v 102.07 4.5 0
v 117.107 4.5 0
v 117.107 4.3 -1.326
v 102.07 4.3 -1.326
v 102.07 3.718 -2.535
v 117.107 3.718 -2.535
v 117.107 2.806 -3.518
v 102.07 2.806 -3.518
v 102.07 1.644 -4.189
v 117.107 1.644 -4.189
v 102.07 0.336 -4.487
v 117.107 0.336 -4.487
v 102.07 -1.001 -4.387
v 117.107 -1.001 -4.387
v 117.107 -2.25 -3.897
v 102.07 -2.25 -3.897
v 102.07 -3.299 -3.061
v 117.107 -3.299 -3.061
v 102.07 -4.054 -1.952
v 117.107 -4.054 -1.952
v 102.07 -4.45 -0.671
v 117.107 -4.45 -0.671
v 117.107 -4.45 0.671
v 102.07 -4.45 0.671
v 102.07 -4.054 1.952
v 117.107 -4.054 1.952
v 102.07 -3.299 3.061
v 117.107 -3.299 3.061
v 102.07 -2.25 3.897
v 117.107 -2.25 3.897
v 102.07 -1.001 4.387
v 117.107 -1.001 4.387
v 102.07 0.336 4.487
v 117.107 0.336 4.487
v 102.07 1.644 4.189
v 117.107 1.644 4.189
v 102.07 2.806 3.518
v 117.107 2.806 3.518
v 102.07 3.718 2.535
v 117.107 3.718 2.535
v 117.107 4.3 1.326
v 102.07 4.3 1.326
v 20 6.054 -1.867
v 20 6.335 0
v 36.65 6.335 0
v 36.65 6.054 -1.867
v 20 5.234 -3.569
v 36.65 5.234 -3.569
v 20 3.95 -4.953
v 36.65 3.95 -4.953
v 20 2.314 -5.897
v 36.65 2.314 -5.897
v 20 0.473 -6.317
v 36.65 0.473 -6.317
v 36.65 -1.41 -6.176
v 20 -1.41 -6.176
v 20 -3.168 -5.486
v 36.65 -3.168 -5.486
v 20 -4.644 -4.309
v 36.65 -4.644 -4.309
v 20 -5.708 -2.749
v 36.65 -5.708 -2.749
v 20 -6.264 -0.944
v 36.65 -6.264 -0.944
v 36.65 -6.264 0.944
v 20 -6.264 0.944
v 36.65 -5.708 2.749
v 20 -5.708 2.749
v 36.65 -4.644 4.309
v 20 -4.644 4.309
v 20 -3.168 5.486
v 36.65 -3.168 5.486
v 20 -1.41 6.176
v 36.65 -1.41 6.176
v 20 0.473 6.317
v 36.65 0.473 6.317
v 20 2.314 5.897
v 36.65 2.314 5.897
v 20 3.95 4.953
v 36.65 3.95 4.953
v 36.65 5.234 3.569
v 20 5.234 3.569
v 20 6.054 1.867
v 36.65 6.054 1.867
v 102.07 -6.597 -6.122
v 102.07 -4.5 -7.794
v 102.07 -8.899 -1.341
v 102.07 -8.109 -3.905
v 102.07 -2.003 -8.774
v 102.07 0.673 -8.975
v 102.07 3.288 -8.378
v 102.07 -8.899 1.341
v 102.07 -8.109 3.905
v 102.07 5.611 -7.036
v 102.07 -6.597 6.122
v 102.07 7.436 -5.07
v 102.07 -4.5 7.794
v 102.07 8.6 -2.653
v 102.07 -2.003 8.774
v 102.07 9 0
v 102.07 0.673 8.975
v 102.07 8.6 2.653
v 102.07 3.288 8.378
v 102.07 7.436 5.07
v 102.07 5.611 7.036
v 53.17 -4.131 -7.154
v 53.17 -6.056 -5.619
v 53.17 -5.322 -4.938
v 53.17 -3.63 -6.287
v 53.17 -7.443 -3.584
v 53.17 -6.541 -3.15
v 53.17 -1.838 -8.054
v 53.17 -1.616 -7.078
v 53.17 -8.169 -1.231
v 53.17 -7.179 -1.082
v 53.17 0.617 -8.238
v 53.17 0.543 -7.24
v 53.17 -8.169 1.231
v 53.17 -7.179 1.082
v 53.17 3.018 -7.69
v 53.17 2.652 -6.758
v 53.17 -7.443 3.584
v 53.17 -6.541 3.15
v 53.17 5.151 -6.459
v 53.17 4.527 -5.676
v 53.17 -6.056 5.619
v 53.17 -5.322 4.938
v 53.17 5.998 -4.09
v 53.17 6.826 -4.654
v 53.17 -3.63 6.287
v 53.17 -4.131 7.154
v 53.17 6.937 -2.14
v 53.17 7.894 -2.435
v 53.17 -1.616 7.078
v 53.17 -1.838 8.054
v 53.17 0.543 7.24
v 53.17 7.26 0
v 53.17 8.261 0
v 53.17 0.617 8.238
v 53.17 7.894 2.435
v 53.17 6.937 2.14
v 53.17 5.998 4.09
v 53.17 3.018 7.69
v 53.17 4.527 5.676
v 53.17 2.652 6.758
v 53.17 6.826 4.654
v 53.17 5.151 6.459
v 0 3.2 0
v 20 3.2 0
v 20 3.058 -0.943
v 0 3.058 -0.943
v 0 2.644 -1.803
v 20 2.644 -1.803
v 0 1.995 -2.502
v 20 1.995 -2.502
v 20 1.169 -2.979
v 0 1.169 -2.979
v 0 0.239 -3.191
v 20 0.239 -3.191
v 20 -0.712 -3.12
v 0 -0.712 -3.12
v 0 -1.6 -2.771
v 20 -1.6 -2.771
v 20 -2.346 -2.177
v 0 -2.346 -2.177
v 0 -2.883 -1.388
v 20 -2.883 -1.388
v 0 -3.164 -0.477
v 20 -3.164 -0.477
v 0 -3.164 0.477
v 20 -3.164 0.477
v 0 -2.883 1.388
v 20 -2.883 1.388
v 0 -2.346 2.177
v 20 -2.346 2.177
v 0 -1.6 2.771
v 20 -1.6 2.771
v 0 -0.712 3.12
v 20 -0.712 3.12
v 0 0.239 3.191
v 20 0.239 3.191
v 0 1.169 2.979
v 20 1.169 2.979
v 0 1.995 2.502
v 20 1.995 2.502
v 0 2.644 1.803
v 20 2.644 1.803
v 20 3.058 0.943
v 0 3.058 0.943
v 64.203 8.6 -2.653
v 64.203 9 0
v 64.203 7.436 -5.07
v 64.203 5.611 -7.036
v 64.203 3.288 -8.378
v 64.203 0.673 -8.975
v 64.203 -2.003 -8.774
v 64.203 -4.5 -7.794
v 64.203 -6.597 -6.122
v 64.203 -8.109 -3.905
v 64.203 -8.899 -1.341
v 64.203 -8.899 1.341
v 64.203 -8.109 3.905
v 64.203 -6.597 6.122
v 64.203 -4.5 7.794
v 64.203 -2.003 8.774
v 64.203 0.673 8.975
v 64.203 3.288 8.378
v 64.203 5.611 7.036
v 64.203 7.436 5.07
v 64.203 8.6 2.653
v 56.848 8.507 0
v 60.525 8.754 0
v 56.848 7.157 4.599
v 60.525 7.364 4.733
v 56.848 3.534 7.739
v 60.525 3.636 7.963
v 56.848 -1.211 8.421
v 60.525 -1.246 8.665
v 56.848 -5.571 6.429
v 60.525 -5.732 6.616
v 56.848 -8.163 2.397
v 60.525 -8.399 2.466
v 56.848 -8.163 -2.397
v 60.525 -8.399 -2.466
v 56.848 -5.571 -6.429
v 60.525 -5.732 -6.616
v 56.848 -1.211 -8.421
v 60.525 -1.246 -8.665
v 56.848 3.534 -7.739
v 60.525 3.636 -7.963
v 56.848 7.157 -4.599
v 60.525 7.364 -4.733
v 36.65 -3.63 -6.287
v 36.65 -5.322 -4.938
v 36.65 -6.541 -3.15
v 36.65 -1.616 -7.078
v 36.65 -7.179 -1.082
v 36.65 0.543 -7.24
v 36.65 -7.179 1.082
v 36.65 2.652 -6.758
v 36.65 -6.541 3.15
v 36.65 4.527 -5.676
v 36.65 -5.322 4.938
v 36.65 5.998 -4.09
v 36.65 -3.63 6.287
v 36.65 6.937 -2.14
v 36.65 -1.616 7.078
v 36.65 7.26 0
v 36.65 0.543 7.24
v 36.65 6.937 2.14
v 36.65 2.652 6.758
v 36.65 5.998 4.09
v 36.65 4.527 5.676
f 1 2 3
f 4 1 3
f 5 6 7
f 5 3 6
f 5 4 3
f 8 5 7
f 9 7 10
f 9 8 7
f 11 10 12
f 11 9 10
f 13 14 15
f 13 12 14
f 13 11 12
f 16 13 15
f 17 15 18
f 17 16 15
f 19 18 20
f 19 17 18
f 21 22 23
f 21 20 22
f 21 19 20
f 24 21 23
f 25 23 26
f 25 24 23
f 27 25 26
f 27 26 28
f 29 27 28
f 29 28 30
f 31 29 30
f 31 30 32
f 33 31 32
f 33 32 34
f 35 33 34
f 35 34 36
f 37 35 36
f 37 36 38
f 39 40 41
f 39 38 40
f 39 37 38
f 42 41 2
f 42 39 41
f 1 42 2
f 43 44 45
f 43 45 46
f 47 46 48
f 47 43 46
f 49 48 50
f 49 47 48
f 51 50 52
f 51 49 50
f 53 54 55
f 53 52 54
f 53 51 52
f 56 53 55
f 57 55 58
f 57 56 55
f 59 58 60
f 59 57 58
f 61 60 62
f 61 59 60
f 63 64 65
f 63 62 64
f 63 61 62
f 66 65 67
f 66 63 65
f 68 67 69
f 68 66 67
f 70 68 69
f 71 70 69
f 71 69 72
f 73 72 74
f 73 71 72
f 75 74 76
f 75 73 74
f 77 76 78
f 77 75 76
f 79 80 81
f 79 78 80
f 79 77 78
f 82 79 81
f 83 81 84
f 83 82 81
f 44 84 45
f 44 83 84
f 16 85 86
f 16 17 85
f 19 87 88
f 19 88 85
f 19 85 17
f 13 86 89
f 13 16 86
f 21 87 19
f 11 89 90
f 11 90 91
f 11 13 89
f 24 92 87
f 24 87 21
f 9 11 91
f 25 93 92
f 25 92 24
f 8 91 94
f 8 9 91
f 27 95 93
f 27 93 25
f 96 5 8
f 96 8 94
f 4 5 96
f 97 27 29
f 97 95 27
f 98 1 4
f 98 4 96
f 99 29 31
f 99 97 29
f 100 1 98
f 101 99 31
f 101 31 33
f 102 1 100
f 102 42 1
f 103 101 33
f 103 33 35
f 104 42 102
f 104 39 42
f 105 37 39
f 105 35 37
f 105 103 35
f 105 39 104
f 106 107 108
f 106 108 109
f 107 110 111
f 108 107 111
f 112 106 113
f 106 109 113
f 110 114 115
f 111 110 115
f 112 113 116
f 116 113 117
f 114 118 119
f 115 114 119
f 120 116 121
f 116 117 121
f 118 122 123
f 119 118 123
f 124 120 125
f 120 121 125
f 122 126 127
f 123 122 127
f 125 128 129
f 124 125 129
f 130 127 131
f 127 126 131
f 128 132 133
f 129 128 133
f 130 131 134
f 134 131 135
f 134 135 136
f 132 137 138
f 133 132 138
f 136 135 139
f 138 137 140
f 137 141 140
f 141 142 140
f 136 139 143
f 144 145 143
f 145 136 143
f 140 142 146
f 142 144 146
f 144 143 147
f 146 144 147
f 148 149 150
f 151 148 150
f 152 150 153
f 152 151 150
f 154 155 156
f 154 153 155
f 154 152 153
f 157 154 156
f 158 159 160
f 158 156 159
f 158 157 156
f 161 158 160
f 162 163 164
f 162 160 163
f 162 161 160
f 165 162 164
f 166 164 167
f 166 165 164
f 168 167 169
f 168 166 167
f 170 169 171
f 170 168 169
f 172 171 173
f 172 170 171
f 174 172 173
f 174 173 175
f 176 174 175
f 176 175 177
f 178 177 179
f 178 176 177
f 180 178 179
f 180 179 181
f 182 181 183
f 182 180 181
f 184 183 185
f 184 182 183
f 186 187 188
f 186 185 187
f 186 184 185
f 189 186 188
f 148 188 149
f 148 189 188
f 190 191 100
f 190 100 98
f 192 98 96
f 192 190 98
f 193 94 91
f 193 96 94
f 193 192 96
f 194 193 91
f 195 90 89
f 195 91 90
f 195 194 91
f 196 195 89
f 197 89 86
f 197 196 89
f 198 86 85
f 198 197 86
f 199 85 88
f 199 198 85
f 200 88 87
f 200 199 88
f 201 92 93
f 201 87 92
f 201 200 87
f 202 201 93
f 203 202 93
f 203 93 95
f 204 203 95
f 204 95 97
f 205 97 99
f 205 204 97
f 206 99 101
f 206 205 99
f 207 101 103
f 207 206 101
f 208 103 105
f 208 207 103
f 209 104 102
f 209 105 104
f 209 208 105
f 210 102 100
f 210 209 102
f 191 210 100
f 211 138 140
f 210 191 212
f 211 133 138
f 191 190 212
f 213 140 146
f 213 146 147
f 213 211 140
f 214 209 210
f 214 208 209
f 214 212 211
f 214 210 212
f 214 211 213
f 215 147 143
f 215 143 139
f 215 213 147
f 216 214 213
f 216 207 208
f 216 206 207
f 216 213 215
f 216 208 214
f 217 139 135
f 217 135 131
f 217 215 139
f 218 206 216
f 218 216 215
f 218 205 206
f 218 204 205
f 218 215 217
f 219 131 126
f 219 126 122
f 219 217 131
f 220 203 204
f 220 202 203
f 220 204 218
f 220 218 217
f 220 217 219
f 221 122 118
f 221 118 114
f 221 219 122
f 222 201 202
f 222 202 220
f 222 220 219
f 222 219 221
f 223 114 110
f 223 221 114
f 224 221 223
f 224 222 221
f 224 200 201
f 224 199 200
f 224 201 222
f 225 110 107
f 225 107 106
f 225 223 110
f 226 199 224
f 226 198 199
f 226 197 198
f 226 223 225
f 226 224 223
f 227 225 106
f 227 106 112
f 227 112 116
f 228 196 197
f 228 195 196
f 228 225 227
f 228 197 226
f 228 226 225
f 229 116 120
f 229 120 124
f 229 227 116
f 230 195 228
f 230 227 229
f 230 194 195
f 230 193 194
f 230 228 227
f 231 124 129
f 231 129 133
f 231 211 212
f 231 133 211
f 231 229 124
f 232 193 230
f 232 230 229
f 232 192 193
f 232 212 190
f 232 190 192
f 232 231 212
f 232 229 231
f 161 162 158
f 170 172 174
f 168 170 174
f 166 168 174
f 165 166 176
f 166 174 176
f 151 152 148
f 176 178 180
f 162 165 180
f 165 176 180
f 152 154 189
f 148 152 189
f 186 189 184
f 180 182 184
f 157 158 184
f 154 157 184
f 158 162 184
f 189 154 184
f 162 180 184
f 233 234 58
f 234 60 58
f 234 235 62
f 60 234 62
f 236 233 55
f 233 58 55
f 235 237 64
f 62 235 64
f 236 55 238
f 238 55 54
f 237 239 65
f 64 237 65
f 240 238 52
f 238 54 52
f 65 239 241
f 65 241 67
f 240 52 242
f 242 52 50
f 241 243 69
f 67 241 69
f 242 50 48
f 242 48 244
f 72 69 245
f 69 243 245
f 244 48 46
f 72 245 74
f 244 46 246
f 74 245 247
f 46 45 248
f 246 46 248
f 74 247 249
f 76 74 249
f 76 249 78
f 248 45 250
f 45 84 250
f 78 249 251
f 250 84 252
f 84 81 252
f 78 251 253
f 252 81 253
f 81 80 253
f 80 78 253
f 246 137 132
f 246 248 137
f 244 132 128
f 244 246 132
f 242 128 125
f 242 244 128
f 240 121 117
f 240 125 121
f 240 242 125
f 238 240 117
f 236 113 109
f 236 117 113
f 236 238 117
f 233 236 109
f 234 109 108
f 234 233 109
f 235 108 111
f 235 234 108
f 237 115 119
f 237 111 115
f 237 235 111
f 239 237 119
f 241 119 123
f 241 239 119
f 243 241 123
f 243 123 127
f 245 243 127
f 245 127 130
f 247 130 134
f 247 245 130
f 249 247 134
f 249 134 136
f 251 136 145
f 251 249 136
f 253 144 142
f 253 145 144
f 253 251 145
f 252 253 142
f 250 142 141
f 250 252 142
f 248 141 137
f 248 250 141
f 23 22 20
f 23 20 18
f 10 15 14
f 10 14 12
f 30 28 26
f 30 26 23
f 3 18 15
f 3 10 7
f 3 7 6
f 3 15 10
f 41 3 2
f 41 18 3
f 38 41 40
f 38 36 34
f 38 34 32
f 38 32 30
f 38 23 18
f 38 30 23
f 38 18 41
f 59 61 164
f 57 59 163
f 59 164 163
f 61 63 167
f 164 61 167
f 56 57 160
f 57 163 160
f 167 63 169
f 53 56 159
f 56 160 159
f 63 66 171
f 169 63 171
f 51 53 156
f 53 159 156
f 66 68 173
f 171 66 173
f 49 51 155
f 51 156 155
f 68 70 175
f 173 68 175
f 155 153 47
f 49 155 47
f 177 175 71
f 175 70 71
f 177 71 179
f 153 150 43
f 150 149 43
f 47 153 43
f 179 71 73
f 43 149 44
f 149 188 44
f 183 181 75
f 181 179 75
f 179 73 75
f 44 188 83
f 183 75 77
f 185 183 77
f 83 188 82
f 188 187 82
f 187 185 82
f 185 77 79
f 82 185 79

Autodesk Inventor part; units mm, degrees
ref_plane "YZ Plane" through (0, 0, 0) normal (1, 0, 0) x (0, 1, 0)
ref_plane "XZ Plane" through (0, 0, 0) normal (0, 1, 0) x (-1, 0, 0)
ref_plane "XY Plane" through (0, 0, 0) normal (0, 0, 1) x (1, 0, 0)
sketch "Sketch1" plane through (0, 0, 0) normal (0, 0, 1) x (1, 0, 0)
  line L0 (0, 0) -> (20, 0)
  line L1 (20, 0) -> (20, 3.2)
  line L2 (20, 3.2) -> (0, 3.2)
  line L3 (0, 3.2) -> (0, 0)
  line L4 (20, 0) -> (36.65, 0)
  line L5 (36.65, 0) -> (36.65, 6.335)
  line L6 (36.65, 6.335) -> (20, 6.335)
  line L7 (20, 6.335) -> (20, 0)
  line L8 (36.65, 0) -> (53.17, 0)
  line L9 (53.17, 0) -> (53.17, 7.26)
  line L10 (53.17, 7.26) -> (36.65, 7.26)
  line L11 (36.65, 7.26) -> (36.65, 0)
  line L12 (53.17, 0) -> (102.07, 0)
  line L13 (102.07, 0) -> (102.07, 9)
  line L14 (102.07, 9) -> (64.2031, 9)
  line L15 (53.17, 9) -> (53.17, 0)
  line L16 (102.07, 0) -> (117.1074, 0)
  line L17 (117.1074, 0) -> (117.1074, 4.5)
  line L18 (117.1074, 4.5) -> (102.07, 4.5)
  line L19 (102.07, 4.5) -> (102.07, 0)
  line L20 (53.17, 8.2611) -> (64.2031, 9)
  dimension "d0" = 20
  dimension "d1" = 3.2
  dimension "d2" = 16.65
  dimension "d3" = 6.335
  dimension "d4" = 16.52
  dimension "d5" = 7.26
  dimension "d6" = 48.9
  dimension "d7" = 9
revolve "Revolution1" add sketch "Sketch1" angle 360 about axis through (53.17, 0, 0) along (1, 0, 0)
properties part number "00_Micrometer"
